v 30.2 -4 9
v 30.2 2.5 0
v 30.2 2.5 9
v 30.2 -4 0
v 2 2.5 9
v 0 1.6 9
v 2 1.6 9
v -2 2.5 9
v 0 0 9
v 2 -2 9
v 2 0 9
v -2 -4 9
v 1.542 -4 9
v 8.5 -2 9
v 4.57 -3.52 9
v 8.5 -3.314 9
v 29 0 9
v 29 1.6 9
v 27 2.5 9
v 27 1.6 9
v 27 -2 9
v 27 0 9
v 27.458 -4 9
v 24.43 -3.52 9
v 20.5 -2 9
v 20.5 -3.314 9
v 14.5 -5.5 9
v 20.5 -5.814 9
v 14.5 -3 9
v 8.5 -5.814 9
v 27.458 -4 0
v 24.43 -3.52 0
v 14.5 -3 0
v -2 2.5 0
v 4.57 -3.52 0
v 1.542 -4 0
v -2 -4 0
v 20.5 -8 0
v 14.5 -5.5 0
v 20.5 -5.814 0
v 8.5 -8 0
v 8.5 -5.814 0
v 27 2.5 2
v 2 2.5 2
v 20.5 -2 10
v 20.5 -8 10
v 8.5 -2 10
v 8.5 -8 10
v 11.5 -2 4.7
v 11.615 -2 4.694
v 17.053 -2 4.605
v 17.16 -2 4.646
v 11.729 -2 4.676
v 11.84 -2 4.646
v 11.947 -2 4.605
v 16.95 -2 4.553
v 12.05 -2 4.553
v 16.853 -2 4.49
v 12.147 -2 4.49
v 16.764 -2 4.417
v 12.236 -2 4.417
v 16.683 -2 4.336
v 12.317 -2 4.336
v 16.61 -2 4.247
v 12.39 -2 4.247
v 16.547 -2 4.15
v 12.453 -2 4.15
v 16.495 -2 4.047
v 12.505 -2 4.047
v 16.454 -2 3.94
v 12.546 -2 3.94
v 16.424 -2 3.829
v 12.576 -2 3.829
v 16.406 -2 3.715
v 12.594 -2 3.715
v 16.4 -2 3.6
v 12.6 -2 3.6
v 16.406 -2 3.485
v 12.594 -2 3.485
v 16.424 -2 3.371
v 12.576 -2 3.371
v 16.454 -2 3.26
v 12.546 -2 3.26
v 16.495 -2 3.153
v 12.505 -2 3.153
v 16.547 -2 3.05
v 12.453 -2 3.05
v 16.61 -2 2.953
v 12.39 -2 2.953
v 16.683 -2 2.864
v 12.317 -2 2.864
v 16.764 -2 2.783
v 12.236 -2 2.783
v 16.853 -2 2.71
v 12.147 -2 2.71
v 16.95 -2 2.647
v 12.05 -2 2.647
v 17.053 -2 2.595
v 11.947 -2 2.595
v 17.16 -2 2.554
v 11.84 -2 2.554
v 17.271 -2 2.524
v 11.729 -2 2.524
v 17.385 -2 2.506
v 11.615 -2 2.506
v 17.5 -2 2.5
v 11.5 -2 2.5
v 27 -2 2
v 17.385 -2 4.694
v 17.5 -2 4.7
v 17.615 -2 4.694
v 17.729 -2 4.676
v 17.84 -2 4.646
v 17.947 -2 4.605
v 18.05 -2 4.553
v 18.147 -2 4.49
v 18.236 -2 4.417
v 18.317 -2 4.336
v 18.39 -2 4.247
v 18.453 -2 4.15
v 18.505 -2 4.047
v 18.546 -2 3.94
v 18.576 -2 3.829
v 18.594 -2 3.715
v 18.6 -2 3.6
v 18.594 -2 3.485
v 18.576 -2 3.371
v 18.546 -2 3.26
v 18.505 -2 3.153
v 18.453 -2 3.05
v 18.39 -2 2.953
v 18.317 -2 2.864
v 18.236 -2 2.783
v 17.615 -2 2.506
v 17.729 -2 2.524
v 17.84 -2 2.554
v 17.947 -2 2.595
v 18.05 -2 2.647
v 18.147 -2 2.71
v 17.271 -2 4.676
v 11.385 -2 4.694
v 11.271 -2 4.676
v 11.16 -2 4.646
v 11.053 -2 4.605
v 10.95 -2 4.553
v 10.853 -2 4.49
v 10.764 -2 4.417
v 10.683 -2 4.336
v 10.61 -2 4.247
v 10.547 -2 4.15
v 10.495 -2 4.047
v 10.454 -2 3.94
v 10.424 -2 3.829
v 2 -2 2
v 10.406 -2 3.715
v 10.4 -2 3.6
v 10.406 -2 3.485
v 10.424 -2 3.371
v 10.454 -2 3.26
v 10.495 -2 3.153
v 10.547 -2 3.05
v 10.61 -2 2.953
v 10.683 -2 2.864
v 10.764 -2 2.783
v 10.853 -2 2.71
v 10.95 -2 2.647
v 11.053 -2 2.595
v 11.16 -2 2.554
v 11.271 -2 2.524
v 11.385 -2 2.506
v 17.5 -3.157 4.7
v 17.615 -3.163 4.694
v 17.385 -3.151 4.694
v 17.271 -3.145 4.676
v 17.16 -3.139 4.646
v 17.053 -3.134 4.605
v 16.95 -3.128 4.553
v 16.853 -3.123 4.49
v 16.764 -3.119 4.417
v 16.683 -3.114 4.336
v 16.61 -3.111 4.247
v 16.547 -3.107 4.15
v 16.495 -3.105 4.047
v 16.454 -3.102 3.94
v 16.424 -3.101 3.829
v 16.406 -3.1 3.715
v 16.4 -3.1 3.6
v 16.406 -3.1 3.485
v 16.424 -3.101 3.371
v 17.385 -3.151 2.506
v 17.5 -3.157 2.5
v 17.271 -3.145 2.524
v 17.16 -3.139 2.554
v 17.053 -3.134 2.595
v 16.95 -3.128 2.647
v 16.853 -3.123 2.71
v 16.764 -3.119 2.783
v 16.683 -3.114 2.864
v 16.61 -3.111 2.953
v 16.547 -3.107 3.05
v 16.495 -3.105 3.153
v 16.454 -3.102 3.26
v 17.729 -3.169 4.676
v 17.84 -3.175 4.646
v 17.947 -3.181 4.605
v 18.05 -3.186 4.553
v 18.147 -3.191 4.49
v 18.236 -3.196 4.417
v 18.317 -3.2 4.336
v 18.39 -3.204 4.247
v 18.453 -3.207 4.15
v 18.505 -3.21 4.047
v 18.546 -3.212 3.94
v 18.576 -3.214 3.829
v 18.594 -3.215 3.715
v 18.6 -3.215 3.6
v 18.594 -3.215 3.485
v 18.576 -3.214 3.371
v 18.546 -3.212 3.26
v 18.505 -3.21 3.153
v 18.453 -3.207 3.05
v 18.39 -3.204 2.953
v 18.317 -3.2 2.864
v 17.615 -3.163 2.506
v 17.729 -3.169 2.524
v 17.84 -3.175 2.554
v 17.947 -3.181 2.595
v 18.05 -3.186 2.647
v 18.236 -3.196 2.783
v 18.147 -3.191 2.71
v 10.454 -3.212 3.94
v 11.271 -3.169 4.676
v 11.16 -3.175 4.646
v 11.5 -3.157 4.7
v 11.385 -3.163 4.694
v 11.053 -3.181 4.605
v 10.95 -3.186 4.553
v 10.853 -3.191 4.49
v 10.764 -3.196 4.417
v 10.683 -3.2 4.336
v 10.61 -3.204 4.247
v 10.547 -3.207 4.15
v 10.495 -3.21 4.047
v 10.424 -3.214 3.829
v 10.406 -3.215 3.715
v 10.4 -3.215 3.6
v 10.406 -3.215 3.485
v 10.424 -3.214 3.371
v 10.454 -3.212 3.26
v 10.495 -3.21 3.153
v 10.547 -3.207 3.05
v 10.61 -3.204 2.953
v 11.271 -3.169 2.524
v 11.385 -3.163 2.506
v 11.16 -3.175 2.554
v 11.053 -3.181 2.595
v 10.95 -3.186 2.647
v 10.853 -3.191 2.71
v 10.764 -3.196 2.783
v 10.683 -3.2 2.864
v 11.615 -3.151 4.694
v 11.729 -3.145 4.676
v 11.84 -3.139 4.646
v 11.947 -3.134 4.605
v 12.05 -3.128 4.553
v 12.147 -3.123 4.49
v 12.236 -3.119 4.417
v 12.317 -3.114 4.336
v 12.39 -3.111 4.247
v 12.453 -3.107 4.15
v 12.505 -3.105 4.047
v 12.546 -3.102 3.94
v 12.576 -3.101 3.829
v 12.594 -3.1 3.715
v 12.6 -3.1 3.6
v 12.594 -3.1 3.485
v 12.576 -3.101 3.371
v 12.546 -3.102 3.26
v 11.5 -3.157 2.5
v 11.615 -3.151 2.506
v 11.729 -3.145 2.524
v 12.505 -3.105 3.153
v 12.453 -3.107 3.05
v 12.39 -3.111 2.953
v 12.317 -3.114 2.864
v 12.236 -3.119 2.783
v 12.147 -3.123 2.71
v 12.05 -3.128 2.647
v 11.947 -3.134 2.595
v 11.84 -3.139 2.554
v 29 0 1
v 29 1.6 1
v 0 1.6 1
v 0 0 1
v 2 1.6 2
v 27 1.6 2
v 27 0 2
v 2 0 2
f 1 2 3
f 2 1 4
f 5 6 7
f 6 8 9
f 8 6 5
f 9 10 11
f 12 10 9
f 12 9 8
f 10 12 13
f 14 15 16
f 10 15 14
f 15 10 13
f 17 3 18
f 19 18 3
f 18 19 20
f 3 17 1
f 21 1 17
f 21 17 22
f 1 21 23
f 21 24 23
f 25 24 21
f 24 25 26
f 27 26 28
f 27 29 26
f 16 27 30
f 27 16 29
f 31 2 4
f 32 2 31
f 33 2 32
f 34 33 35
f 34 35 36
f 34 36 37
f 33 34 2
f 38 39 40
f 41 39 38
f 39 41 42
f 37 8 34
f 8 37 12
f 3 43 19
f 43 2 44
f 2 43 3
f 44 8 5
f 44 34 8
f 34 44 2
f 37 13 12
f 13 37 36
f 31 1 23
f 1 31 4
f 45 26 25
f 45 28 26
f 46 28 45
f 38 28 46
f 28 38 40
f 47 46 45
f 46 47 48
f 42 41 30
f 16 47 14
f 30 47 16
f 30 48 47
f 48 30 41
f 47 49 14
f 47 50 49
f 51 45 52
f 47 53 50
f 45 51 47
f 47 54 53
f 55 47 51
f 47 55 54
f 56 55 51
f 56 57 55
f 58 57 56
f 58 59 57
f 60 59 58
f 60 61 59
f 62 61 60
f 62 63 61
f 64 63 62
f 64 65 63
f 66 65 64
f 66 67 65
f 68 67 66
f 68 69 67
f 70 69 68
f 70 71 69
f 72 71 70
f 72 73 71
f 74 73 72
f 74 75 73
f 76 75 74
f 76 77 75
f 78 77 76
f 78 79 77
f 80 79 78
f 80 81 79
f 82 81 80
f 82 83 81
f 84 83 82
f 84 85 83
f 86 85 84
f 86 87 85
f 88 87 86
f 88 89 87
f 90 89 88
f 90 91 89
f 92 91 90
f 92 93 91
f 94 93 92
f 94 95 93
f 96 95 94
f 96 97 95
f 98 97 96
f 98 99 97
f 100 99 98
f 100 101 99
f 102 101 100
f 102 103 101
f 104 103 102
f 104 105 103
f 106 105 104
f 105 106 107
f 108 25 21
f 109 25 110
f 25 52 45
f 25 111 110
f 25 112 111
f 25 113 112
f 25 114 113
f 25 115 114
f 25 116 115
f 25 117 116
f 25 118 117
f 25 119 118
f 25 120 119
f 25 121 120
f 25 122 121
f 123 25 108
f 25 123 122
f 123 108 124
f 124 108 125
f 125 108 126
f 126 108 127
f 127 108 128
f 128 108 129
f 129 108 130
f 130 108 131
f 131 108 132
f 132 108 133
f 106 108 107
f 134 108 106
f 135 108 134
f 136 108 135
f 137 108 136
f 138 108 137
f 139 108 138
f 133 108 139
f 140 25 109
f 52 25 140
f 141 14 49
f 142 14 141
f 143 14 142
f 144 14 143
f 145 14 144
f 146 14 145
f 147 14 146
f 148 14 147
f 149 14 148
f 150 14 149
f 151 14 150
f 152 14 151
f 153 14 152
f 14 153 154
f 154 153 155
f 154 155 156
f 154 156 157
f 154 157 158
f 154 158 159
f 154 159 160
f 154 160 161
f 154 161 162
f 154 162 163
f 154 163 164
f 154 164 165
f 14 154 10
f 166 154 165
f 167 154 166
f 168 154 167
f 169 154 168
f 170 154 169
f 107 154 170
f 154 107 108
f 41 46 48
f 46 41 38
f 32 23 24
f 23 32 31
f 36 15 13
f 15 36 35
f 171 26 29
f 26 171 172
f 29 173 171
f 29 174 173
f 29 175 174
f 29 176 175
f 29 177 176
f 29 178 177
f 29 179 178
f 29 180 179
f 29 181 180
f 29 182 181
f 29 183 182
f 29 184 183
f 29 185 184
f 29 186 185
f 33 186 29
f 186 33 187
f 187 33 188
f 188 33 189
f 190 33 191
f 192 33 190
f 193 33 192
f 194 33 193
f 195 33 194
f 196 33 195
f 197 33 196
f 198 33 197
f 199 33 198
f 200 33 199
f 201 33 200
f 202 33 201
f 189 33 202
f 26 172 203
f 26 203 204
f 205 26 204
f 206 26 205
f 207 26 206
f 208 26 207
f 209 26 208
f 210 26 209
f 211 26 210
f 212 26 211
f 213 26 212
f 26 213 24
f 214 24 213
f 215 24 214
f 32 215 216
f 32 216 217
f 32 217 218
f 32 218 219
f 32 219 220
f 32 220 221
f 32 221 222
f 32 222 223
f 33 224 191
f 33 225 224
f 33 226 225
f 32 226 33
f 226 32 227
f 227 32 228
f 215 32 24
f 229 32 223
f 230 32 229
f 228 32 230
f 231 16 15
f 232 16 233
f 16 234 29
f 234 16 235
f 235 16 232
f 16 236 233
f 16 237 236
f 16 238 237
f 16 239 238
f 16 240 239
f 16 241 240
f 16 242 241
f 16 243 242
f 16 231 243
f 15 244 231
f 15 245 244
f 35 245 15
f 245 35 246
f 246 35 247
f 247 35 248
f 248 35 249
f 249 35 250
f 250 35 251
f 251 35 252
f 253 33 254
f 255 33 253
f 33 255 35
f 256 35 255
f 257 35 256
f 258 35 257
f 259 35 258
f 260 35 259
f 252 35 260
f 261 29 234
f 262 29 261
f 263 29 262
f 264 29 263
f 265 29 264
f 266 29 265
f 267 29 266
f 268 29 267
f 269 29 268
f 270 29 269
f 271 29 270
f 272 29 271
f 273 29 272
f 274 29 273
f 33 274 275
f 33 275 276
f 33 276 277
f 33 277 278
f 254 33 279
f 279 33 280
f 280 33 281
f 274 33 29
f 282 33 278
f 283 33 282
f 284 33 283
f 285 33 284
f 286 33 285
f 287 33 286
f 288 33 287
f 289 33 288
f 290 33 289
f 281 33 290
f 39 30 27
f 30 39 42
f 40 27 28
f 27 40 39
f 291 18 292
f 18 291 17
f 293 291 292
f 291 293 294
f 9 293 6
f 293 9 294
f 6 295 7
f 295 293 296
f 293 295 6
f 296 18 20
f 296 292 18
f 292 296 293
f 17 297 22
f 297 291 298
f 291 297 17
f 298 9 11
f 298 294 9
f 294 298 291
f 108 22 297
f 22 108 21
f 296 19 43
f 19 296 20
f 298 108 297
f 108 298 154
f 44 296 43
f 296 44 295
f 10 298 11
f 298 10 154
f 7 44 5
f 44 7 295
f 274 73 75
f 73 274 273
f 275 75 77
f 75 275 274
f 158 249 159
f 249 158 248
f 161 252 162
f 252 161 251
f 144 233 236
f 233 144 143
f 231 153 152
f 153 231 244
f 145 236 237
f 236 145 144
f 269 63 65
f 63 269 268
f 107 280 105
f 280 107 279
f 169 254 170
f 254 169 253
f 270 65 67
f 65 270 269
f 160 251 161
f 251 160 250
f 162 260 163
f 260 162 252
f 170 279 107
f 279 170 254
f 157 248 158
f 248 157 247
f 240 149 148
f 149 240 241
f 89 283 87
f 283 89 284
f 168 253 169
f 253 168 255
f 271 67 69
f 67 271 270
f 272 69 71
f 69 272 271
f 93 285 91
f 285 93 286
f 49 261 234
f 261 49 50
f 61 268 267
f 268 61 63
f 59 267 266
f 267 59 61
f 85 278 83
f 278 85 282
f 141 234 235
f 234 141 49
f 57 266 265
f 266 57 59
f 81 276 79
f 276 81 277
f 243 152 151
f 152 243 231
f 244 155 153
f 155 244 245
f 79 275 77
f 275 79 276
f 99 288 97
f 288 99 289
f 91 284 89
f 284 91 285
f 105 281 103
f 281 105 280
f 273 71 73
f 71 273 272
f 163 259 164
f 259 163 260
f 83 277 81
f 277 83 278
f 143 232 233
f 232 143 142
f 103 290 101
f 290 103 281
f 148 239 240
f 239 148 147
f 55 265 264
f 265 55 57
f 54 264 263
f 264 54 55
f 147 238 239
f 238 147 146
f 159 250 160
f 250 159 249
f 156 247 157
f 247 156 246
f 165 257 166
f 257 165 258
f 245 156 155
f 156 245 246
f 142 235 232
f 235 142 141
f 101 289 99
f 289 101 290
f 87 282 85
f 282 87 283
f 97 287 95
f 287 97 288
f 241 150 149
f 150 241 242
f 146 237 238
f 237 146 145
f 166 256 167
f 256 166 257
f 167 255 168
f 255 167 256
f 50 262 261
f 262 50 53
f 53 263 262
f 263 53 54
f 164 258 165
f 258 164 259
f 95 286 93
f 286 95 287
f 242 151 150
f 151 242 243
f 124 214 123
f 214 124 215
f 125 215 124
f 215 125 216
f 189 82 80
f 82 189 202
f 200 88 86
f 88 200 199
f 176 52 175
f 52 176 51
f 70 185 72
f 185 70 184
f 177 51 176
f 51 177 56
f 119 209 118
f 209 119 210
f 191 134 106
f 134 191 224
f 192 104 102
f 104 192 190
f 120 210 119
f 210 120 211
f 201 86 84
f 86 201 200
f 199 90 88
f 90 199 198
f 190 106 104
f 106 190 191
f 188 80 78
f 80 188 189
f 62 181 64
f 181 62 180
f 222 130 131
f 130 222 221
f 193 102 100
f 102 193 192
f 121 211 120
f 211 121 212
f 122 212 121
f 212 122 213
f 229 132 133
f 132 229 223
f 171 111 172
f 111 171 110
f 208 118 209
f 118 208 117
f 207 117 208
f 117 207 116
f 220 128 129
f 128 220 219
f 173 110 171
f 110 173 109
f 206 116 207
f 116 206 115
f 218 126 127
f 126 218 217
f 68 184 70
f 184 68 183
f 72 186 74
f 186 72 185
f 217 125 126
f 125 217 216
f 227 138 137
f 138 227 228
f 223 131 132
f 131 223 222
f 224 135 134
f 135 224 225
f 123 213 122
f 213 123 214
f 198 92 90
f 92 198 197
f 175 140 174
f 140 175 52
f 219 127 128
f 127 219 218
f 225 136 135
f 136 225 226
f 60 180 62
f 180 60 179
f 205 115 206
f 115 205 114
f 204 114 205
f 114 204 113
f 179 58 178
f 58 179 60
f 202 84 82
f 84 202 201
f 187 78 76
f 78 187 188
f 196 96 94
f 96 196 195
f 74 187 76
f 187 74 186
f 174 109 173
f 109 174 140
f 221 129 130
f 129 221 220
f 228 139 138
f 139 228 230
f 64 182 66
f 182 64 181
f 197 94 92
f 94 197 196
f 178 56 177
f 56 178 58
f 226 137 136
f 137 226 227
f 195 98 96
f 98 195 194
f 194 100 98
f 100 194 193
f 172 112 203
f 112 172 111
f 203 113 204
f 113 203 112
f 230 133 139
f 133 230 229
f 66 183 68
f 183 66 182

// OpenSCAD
$fn=60;
width=29;
depth=1.6;
height=9;
holeDist = 6;



difference() {
    union(){
        translate([-2, -4, 0]) cube([width+depth*2, 6.5, height]);
        translate([width/2-12/2, -8, 0]) cube([12, 6, 10]);
    }
    translate([0, 0, 1]) cube([width, depth, height]); // board
    translate([2, -2, 2]) cube([width-4, 5, height-1]); // circuit board

translate([width/2-holeDist/2, 1, height*0.4]) rotate([90, 0, 0]) cylinder(r=1.1, h=5);
translate([width/2+holeDist/2, 1, height*0.4]) rotate([90, 0, 0]) cylinder(r=1.1, h=5); 
difference() {
    translate([width/2, -98, 0]) cylinder(r=95, h=9);
    translate([width/2, -98, 0]) cylinder(r=92.5, h=9);
}
}
